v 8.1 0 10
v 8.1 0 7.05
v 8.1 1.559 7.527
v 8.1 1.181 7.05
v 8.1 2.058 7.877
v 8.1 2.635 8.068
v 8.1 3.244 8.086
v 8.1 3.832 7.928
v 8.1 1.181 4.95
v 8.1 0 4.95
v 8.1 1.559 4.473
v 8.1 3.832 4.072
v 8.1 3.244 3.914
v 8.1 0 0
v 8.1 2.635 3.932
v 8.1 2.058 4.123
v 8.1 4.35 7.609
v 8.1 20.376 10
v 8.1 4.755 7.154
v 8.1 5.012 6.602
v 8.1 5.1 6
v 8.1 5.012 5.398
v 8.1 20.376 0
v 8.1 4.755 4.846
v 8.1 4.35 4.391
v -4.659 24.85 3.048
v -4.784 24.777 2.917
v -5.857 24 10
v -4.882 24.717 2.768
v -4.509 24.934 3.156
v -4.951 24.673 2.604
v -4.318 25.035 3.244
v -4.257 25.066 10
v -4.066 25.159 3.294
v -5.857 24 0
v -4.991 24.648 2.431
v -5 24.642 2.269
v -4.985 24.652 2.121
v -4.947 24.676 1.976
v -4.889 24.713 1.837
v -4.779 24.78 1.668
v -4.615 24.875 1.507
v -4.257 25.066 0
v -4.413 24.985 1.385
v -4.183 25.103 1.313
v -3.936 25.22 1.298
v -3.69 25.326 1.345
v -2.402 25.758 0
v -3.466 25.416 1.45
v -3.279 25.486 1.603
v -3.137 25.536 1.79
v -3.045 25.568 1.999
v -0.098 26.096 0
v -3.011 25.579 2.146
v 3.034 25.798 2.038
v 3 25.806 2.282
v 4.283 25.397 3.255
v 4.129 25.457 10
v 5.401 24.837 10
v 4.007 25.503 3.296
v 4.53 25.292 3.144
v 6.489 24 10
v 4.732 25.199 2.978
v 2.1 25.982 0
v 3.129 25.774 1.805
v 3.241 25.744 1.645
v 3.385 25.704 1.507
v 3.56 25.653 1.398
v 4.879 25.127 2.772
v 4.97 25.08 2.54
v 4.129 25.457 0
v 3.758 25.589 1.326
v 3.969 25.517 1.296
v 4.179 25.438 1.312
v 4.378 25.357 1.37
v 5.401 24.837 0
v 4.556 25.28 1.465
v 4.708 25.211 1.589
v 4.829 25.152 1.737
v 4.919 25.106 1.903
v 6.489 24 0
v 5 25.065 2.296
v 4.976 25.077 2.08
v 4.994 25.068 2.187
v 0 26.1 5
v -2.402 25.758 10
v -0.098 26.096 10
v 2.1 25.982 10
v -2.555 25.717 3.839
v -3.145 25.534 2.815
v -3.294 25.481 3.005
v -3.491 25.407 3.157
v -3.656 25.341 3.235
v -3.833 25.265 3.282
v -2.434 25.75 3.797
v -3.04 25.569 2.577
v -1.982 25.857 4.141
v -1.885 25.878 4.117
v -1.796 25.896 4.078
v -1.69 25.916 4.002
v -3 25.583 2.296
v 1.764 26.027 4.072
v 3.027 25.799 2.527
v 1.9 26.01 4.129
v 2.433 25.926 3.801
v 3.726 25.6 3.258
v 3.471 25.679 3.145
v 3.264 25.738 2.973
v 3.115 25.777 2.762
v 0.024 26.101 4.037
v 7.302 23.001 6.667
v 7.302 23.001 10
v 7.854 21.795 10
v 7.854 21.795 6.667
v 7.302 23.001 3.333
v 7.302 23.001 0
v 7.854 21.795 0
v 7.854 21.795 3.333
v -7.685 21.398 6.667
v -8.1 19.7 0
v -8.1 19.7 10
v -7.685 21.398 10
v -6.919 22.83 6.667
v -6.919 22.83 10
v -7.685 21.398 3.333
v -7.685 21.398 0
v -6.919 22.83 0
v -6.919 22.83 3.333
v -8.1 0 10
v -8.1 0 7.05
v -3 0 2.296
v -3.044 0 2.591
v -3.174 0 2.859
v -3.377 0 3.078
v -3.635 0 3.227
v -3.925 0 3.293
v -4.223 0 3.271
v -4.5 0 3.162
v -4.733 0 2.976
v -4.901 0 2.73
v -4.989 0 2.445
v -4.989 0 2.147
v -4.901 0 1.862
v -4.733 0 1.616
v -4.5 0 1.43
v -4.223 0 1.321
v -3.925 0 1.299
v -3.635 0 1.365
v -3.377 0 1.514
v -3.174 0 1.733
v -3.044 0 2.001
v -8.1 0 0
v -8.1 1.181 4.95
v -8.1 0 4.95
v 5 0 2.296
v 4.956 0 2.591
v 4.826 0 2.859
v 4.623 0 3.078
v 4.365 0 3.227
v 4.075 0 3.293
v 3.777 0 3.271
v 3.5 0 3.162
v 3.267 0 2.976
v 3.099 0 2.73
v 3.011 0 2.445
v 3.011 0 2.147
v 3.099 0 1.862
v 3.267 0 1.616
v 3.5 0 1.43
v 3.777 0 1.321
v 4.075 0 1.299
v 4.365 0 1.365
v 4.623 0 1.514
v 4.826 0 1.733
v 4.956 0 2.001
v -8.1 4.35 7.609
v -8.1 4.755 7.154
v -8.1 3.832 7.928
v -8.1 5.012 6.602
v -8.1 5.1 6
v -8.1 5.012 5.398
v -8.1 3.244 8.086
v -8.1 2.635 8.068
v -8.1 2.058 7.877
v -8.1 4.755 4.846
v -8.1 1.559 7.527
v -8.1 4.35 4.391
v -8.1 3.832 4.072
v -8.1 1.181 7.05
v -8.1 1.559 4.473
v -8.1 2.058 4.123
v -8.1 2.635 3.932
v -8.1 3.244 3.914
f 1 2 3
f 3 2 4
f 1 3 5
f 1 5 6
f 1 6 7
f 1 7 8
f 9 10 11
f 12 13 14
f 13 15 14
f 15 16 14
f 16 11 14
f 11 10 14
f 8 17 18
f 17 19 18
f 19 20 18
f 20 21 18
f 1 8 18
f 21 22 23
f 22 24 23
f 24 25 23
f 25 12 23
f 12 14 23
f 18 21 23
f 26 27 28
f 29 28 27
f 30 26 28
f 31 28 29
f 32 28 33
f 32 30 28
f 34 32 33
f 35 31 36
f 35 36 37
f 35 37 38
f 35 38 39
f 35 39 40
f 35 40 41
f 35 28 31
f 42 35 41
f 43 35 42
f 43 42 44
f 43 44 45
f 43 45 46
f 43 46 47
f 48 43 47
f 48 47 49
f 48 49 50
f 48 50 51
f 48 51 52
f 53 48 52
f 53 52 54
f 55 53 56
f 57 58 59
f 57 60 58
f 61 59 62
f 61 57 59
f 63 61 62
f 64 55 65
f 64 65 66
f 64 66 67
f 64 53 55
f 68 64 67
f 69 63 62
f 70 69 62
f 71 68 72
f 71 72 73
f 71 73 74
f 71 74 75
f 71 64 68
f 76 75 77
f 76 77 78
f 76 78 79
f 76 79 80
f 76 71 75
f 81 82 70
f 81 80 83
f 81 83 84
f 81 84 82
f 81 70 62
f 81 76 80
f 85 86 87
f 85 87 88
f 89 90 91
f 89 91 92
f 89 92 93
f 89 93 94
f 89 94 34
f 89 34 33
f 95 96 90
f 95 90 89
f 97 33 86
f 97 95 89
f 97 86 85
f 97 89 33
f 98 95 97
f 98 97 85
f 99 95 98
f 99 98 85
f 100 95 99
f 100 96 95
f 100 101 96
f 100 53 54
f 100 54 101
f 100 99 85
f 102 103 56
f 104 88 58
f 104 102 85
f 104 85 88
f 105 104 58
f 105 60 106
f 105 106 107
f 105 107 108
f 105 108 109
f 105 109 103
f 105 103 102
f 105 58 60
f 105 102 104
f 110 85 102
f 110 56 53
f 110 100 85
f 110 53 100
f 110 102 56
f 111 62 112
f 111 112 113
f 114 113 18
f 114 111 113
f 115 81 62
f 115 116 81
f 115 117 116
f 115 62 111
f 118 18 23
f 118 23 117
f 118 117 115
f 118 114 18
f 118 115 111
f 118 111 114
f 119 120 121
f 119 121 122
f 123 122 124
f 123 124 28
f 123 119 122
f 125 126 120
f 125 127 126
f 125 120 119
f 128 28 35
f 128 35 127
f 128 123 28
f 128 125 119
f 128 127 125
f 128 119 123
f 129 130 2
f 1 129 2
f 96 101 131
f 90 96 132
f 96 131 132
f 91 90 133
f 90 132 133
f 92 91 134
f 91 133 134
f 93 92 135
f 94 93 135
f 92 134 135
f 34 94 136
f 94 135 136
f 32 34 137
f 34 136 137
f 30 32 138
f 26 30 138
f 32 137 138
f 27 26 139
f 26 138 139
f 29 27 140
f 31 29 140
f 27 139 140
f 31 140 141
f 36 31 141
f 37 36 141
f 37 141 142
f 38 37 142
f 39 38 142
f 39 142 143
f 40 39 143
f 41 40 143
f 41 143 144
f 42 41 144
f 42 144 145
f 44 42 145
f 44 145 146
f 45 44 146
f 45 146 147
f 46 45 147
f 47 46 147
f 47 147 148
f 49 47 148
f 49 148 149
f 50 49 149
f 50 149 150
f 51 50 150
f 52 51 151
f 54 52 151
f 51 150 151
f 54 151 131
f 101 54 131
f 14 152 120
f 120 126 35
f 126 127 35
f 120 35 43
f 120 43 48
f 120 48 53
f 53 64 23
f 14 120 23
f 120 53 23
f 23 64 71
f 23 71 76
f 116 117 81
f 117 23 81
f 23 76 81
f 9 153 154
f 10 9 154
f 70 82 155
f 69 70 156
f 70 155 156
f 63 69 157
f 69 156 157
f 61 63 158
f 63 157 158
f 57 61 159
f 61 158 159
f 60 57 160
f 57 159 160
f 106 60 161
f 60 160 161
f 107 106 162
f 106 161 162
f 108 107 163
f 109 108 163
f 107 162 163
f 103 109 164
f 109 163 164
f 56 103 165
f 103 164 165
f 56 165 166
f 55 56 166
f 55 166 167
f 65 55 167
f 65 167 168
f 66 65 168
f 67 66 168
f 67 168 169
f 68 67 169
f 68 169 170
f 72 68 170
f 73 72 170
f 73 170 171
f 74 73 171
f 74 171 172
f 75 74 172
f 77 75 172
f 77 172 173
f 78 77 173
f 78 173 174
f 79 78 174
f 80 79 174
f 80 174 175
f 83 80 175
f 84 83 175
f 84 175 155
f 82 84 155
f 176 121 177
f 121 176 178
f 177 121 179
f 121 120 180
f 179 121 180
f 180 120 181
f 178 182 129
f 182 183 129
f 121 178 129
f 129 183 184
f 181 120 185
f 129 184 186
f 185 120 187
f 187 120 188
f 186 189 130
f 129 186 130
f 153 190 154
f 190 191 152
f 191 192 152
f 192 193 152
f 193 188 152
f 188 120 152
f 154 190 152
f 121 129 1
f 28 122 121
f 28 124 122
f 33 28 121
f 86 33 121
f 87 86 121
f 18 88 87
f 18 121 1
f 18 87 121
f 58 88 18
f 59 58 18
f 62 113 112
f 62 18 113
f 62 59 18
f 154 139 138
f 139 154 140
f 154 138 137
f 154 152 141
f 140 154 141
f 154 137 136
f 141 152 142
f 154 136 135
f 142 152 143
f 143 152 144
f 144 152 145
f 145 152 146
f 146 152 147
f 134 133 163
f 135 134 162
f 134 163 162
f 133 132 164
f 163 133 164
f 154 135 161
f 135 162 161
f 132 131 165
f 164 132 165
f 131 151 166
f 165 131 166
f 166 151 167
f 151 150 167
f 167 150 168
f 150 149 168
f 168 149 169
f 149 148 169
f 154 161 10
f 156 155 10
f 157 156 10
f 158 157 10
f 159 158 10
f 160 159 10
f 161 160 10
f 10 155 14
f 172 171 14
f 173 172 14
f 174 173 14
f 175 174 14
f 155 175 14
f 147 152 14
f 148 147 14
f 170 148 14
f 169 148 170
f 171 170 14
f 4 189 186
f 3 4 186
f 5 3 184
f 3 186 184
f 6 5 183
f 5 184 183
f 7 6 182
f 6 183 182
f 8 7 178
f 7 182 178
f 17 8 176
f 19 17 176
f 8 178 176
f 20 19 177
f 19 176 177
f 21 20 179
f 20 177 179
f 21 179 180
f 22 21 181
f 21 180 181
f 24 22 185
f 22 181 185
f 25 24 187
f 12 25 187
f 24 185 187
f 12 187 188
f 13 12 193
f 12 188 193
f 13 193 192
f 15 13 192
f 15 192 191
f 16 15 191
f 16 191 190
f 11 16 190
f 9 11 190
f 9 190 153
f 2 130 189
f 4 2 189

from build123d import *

# Parameters (mm, degrees)
BOSS_EXTRUDE1_DEPTH      = 10
CUT_EXTRUDE9_REACH       = 28.107
SKETCH11_R               = 1
CUT_EXTRUDE16_DEPTH      = 14.1
CUT_EXTRUDE16_DEPTH_BACK = 14.1


with BuildPart() as part:
    # Sketch1 → Boss-Extrude1 (new body)
    with BuildSketch(Plane.XY):
        with BuildLine():
            Line((-8.1, 0), (8.1, 0))
            Line((8.1, 0), (8.1, 19.7))
            Line((8.1, 19.7), (8.1, 20.376450886))
            add(Edge.make_bspline(
                [(6.48935173, 24), (7.416747291, 23.101820665), (8.022787745, 21.902680364), (8.1, 20.376450886)],
                knots=[0.795779931, 0.795779931, 0.795779931, 0.795779931, 0.974400134, 0.974400134, 0.974400134, 0.974400134], degree=3))
            Line((6.48935173, 24), (-5.856909443, 24))
            add(Edge.make_bspline(
                [(-8.1, 19.7), (-7.879513959, 21.531569286), (-7.049405333, 22.960789218), (-5.856909443, 24)],
                knots=[0, 0, 0, 0, 0.215700958, 0.215700958, 0.215700958, 0.215700958], degree=3))
            Line((-8.1, 19.7), (-8.1, 0))
        make_face()
        with BuildLine():
            add(Edge.make_bspline(
                [(-5.856909443, 24), (-4.327036412, 25.333220988), (0.13018942, 26.782367162), (4.914346008, 25.525387495), (6.48935173, 24)],
                knots=[0.215700958, 0.215700958, 0.215700958, 0.215700958, 0.492427344, 0.795779931, 0.795779931, 0.795779931, 0.795779931], degree=3))
            Line((-5.856909443, 24), (6.48935173, 24))
        make_face()
    extrude(amount=BOSS_EXTRUDE1_DEPTH)

    # Sketch11 → Cut-Extrude9 (cut, up to next)
    with BuildSketch(Plane.XZ, mode=Mode.PRIVATE) as cut_extrude9_sk1:
        with Locations((4, 2.295920755)):
            Circle(SKETCH11_R)
    cut_extrude9_tool1 = extrude(cut_extrude9_sk1.sketch, amount=-CUT_EXTRUDE9_REACH, mode=Mode.PRIVATE) & part.part
    add(cut_extrude9_tool1.solids().sort_by_distance((4, 0, 2.295921))[0], mode=Mode.SUBTRACT)
    # Sketch11 → Cut-Extrude9 (cut, up to next)
    with BuildSketch(Plane.XZ, mode=Mode.PRIVATE) as cut_extrude9_sk2:
        with Locations((-4, 2.295920755)):
            Circle(SKETCH11_R)
    cut_extrude9_tool2 = extrude(cut_extrude9_sk2.sketch, amount=-CUT_EXTRUDE9_REACH, mode=Mode.PRIVATE) & part.part
    add(cut_extrude9_tool2.solids().sort_by_distance((-4, 0, 2.295921))[0], mode=Mode.SUBTRACT)

    # Sketch14 → Cut-Extrude16 (cut, two sides)
    with BuildSketch(Plane.ZY) as cut_extrude16_sk:
        with BuildLine():
            Line((4.95, 1.181346652), (4.95, 0))
            Line((4.95, 0), (7.05, 0))
            Line((7.05, 0), (7.05, 1.181346652))
            ThreePointArc((7.05, 1.181346652), (6, 5.1), (4.95, 1.181346652))
        make_face()
    extrude(amount=CUT_EXTRUDE16_DEPTH, mode=Mode.SUBTRACT)
    extrude(cut_extrude16_sk.sketch, amount=-CUT_EXTRUDE16_DEPTH_BACK, mode=Mode.SUBTRACT)


solid = part.part
